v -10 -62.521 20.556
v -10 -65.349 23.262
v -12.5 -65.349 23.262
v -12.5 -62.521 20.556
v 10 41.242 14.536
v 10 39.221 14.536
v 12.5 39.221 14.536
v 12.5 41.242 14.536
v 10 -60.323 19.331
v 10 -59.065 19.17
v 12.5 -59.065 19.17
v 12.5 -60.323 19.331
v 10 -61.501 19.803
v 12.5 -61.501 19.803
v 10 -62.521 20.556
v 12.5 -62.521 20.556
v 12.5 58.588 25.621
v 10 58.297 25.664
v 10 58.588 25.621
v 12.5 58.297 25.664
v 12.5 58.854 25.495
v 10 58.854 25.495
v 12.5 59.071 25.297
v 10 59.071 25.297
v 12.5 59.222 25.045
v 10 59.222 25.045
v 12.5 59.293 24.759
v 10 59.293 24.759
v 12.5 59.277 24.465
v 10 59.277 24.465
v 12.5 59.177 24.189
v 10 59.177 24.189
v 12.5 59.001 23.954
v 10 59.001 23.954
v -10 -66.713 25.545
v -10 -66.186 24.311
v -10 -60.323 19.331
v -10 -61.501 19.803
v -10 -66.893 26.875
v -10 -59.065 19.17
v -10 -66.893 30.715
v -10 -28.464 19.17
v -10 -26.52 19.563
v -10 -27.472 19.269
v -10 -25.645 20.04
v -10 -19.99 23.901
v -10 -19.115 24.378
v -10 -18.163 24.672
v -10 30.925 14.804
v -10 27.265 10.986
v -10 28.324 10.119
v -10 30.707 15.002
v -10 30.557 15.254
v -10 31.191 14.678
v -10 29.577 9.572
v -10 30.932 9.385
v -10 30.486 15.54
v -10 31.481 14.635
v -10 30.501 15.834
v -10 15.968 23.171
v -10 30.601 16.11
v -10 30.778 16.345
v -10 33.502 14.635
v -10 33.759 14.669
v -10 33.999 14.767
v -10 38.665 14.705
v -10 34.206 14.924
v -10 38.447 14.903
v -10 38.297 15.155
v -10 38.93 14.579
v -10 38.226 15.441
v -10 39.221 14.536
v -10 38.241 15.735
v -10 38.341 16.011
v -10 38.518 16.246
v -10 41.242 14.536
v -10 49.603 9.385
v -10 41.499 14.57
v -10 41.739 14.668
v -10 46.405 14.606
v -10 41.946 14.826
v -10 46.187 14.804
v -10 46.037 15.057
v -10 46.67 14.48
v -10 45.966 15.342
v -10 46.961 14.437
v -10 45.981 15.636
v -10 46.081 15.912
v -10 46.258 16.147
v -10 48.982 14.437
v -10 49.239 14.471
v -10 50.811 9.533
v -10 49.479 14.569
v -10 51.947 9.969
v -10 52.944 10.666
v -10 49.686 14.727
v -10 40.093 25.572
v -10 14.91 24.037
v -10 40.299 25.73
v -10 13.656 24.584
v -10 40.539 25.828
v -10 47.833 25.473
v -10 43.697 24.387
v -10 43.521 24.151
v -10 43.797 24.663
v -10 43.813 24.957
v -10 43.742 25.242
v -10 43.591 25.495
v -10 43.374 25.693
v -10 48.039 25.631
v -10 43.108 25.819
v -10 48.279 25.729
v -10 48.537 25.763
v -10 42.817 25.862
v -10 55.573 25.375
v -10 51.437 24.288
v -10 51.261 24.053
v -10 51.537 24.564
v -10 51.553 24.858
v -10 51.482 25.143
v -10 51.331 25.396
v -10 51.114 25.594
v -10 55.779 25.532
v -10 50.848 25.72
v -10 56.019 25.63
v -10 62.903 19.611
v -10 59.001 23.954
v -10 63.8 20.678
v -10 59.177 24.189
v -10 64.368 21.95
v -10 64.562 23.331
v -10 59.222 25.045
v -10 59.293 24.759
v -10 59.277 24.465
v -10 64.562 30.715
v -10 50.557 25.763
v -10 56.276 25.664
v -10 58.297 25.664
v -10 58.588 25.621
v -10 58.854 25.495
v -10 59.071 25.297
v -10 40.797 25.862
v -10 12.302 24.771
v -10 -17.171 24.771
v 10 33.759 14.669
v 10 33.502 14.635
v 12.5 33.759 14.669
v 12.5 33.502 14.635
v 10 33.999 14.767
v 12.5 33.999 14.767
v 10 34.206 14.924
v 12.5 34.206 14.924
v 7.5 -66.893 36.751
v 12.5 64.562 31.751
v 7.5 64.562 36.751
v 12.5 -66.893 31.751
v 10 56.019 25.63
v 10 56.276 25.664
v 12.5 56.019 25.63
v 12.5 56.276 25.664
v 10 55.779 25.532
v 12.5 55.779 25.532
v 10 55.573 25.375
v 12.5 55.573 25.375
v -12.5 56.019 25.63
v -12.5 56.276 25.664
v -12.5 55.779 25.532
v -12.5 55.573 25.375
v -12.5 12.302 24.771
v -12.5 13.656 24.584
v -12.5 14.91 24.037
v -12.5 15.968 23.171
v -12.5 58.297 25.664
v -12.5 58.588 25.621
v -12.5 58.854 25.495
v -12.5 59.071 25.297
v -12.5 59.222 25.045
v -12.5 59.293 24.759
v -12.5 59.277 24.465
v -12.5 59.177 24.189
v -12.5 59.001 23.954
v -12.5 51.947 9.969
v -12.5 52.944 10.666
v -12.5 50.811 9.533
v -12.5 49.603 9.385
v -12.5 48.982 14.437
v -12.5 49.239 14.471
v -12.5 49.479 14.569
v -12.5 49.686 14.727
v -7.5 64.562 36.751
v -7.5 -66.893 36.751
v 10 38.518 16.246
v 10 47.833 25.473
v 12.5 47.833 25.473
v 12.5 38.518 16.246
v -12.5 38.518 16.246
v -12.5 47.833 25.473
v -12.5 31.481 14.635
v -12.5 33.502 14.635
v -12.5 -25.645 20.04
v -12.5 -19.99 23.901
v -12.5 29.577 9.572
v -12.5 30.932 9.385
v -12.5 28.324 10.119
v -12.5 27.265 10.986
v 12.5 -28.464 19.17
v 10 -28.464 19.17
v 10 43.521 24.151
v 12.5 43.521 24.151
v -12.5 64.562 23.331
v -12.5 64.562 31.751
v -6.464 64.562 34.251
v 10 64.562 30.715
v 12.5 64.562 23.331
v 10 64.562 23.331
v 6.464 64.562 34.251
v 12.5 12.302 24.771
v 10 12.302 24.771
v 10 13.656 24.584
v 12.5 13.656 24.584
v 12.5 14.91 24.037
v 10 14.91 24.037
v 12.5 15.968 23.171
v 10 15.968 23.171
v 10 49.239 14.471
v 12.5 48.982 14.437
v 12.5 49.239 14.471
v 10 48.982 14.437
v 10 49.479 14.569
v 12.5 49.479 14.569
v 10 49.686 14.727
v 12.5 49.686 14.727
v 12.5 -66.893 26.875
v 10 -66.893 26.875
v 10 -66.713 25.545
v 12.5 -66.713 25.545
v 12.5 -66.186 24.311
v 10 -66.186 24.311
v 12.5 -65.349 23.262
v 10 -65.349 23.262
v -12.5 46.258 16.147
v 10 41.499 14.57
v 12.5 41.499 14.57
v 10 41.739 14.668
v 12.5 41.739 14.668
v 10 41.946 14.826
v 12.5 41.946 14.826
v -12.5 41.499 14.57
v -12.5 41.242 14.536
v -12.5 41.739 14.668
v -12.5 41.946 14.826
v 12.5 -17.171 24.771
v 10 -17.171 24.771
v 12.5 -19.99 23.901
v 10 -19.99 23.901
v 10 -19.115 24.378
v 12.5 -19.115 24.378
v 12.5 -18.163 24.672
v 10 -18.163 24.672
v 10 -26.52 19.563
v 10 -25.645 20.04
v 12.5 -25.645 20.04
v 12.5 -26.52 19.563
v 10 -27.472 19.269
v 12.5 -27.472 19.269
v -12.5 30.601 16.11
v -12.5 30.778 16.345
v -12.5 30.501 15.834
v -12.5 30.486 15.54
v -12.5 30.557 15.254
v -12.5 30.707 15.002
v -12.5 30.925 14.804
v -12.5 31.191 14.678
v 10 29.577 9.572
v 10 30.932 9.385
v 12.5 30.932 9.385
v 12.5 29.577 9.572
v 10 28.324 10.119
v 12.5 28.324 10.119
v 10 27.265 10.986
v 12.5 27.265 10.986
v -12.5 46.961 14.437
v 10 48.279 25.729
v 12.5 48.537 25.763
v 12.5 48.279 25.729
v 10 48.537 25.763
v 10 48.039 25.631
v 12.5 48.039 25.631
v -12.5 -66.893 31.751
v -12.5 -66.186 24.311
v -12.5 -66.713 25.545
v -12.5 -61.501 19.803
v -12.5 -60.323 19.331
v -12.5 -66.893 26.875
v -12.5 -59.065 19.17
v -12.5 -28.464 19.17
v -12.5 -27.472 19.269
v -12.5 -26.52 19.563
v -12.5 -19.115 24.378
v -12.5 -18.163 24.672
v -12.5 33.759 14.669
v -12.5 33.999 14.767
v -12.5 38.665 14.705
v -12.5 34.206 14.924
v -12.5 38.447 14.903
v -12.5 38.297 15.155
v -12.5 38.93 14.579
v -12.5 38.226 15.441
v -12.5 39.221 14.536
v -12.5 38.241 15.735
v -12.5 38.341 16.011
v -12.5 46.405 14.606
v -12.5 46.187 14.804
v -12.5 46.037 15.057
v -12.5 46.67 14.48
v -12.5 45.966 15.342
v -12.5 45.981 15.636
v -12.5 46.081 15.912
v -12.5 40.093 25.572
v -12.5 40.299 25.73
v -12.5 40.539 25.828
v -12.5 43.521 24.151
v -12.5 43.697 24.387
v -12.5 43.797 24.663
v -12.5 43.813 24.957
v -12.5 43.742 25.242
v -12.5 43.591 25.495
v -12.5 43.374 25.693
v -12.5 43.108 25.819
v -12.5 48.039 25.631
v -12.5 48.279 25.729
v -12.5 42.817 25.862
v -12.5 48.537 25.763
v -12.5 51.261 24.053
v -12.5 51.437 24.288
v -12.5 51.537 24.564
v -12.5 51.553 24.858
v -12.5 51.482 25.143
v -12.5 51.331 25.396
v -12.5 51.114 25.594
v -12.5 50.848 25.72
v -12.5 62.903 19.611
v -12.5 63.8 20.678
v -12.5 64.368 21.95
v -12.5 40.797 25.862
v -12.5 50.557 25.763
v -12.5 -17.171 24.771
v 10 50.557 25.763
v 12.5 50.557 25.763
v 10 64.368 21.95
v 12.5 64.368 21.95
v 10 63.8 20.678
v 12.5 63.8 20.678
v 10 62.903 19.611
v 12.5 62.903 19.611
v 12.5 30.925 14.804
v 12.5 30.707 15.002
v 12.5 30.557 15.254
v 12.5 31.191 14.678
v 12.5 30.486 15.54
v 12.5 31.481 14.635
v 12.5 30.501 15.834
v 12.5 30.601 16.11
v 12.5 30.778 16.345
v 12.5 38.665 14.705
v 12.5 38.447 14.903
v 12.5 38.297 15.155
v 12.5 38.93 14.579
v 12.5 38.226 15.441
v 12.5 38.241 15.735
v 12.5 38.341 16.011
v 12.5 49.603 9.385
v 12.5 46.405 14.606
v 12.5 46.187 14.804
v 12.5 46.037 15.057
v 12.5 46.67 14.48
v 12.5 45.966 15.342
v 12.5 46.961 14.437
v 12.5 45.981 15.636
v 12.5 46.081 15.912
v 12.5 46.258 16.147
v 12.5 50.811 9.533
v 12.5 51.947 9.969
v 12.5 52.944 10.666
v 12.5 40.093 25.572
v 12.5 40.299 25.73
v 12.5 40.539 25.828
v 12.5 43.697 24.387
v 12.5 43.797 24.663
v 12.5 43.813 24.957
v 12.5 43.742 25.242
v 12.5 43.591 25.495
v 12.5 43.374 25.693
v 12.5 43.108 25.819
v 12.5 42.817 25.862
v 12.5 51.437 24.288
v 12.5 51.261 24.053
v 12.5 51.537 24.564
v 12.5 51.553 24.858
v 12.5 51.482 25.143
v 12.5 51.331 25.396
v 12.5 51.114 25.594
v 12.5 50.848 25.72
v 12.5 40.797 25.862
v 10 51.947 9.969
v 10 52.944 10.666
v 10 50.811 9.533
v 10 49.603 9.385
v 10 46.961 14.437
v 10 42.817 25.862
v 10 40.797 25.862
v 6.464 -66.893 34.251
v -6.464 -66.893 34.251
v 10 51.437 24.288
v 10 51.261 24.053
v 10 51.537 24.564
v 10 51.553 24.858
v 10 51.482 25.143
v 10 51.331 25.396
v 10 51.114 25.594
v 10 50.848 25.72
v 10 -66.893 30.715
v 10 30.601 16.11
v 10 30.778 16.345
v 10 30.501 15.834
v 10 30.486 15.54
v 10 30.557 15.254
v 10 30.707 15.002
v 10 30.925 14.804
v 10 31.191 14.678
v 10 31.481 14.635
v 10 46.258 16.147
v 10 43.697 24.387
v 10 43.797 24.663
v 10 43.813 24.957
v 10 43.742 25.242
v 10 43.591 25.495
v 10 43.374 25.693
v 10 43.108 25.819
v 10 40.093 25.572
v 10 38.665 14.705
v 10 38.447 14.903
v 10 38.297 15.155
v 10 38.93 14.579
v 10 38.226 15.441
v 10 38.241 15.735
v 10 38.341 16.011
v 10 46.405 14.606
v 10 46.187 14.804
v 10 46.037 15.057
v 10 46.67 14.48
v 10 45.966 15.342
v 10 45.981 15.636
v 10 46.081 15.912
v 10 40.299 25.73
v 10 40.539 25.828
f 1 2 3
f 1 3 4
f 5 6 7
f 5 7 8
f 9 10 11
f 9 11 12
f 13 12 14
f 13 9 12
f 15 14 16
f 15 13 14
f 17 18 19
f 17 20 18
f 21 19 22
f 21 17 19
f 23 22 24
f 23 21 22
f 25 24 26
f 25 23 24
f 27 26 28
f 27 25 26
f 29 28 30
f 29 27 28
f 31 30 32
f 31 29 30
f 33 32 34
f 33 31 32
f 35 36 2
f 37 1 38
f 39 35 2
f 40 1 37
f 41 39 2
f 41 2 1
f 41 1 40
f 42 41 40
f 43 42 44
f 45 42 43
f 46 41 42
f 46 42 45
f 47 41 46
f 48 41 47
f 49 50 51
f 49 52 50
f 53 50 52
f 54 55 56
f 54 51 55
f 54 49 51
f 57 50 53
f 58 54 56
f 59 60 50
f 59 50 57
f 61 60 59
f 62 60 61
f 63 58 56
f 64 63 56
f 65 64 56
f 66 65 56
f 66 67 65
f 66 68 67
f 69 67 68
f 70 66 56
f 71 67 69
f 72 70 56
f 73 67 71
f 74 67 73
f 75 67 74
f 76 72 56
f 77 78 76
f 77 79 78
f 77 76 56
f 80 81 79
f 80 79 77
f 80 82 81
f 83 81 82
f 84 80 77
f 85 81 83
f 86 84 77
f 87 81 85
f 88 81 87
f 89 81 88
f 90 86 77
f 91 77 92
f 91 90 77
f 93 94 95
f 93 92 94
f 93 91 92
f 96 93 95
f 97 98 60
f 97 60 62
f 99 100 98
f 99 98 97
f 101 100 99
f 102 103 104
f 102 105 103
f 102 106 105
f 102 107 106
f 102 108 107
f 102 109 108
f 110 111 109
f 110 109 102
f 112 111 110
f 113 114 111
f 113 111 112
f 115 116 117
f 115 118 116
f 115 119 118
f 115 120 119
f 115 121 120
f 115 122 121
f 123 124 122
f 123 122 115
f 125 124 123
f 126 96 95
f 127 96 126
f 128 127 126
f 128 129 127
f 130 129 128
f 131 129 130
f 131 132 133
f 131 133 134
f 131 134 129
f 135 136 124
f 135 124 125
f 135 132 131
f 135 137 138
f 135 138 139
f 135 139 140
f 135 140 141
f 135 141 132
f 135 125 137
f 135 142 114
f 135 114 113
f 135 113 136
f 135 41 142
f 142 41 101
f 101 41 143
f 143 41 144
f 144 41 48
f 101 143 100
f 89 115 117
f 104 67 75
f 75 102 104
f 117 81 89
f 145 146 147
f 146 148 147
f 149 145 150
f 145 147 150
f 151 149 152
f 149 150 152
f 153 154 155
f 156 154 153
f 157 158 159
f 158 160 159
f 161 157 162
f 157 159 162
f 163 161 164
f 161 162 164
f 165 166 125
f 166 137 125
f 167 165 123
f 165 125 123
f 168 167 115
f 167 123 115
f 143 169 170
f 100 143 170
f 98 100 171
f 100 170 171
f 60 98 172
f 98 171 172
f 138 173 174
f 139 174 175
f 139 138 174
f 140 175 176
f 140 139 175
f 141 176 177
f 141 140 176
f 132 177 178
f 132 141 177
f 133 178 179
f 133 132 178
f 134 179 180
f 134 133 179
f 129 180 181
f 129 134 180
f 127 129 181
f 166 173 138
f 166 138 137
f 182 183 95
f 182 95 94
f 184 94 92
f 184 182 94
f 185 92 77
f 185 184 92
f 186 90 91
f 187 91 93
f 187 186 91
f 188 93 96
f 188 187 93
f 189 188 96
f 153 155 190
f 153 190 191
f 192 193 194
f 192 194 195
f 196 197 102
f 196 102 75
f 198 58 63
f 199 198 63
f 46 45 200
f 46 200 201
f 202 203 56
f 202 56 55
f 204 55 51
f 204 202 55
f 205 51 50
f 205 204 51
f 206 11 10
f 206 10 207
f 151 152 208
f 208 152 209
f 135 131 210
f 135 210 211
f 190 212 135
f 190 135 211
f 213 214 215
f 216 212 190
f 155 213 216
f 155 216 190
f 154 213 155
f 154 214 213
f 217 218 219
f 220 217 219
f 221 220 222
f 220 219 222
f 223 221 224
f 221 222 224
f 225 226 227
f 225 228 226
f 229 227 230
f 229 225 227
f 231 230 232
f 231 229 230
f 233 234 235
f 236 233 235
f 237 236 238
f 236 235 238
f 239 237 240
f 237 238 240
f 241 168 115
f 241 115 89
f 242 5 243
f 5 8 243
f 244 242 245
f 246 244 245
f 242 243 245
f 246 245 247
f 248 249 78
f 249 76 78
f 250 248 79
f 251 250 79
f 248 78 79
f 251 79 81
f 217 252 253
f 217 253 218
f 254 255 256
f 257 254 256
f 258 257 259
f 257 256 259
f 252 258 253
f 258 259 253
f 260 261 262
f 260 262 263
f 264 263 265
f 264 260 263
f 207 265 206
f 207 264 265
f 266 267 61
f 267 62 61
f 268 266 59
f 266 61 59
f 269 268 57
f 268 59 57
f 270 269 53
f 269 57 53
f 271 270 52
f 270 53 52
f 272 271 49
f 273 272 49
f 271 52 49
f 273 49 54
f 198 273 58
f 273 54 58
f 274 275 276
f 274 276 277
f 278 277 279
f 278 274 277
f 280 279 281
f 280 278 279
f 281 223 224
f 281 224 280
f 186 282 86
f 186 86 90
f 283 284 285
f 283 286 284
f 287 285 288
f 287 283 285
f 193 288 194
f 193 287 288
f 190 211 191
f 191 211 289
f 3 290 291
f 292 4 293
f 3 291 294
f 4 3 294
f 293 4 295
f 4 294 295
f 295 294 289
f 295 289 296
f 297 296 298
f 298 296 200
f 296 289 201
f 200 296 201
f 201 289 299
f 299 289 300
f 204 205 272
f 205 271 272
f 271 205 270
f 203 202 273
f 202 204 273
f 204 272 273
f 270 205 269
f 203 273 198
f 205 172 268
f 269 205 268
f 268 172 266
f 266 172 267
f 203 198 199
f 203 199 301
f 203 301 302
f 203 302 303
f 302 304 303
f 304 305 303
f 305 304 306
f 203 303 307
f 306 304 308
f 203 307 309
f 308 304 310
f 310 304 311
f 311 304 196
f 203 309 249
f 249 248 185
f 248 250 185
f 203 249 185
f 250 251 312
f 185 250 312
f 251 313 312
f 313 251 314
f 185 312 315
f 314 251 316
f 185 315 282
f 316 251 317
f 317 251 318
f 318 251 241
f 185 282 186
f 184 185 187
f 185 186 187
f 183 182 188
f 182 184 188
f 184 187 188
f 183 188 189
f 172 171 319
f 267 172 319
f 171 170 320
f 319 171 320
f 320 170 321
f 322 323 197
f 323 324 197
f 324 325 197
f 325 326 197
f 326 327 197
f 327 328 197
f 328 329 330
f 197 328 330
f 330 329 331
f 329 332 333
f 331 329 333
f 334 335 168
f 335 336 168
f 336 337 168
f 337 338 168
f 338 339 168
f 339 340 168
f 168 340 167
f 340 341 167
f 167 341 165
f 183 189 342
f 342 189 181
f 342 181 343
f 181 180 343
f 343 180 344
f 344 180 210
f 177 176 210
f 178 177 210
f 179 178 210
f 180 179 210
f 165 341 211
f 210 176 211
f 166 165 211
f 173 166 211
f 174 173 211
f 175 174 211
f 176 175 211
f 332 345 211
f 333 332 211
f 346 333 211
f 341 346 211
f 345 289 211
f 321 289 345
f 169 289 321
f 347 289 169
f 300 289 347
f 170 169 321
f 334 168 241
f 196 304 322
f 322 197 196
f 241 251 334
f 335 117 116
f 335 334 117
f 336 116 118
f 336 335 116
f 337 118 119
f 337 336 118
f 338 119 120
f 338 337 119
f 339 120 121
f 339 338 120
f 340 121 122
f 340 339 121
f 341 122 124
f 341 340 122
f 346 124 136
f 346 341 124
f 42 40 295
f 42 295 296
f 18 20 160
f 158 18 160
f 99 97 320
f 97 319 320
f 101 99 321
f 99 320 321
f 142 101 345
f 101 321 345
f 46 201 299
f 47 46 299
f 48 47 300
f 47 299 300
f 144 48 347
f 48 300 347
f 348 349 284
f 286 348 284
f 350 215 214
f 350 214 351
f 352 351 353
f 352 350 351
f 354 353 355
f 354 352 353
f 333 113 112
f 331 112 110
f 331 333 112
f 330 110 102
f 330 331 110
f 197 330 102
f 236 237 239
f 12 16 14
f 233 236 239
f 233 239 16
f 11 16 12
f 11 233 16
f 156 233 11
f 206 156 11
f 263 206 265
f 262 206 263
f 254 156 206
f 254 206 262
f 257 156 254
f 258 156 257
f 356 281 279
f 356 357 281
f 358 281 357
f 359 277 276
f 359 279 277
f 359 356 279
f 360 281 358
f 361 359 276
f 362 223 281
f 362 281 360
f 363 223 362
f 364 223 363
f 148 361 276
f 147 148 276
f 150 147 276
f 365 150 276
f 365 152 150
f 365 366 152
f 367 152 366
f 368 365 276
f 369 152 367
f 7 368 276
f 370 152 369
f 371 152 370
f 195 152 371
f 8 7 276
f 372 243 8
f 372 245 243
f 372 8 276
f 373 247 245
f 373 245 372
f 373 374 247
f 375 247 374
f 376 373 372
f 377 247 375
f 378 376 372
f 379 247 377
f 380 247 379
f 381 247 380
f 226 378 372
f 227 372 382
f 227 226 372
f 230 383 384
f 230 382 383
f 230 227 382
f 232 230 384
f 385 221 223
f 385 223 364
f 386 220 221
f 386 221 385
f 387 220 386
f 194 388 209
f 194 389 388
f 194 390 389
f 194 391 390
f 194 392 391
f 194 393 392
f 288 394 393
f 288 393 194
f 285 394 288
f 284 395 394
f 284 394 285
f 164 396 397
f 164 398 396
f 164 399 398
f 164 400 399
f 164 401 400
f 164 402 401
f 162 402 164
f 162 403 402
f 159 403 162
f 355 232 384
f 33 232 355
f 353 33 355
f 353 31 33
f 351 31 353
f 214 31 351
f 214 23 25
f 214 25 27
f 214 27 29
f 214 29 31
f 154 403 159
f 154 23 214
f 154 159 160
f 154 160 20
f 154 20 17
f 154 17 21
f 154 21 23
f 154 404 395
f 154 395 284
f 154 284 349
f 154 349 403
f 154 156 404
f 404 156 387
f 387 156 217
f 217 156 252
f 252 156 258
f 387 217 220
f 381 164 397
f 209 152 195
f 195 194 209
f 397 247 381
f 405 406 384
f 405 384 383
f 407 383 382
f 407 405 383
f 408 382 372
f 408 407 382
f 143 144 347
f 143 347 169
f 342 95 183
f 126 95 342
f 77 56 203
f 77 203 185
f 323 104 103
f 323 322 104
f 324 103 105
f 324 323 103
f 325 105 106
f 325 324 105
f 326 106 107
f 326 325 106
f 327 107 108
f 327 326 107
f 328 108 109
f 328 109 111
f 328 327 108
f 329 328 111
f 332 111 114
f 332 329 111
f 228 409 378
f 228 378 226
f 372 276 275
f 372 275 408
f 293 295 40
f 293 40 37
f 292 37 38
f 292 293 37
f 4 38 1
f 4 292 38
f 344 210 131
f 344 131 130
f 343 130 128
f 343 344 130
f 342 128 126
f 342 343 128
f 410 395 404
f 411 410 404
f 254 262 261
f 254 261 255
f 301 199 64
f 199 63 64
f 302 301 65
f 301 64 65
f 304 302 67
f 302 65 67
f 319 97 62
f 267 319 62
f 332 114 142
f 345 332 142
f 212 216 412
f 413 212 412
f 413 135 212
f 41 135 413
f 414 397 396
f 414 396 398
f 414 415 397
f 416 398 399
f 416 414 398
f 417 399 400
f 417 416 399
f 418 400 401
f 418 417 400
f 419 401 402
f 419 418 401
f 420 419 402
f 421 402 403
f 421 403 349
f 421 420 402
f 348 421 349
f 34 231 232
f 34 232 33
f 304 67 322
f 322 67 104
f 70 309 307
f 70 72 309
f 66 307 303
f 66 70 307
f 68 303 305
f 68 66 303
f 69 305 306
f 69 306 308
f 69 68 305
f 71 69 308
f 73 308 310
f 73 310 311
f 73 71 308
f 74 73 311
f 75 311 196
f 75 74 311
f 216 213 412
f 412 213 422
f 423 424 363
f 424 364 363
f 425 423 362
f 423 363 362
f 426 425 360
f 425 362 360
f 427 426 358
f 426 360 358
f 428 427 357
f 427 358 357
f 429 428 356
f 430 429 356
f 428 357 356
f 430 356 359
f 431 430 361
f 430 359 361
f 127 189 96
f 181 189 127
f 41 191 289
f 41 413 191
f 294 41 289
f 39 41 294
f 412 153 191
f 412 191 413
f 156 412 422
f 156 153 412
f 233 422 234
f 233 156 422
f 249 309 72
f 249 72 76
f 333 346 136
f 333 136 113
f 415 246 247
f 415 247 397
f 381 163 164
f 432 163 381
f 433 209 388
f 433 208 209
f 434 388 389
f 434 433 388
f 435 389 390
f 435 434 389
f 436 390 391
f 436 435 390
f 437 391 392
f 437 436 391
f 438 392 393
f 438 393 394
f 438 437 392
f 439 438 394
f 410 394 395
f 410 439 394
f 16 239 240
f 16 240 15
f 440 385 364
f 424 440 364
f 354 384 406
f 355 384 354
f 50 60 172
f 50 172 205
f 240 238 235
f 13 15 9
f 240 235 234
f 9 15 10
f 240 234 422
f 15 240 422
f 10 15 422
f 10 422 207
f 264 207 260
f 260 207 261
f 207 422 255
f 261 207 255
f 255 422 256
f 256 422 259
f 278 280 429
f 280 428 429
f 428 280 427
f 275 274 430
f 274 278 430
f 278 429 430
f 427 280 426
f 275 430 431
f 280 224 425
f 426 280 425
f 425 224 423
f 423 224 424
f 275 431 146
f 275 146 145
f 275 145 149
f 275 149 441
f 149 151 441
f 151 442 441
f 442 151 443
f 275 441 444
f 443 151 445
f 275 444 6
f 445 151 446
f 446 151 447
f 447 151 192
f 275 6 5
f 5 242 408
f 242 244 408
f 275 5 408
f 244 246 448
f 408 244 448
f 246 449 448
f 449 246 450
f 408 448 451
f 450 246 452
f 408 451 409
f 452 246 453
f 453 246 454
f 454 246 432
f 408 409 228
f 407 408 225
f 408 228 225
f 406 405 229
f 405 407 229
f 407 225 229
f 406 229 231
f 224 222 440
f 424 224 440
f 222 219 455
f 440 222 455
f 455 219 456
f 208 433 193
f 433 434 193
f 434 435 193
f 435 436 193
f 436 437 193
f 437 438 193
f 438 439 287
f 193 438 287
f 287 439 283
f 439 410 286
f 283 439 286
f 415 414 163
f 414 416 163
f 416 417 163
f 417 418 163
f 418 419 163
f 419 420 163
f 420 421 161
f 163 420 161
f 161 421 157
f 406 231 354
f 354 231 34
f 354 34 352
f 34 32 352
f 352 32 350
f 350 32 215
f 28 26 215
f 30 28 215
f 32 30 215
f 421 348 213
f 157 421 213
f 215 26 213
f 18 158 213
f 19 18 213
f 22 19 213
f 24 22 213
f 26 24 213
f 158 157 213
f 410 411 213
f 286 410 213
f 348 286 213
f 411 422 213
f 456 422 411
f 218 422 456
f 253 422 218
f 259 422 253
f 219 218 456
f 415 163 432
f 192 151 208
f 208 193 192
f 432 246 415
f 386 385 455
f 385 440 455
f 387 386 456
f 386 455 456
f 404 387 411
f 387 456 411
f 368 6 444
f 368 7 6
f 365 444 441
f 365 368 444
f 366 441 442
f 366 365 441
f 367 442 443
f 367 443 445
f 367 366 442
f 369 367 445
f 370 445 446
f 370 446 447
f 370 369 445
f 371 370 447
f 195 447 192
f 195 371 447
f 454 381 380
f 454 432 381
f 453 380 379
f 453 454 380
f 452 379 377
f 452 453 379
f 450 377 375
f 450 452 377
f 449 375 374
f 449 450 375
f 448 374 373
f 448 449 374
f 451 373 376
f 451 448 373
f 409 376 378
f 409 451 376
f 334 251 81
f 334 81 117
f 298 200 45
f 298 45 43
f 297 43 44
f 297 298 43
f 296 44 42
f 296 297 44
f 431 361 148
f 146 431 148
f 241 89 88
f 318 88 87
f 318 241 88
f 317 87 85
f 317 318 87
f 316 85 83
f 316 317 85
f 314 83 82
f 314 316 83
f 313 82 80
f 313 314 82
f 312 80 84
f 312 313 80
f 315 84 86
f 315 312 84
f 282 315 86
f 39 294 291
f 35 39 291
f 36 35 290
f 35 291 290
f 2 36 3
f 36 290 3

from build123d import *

# Parameters (mm, degrees)
F1_DEPTH     = 12.5
F2_SIZE      = 5
F3_T         = -2.5
F4_T1_DEPTH  = 2.5
F4_T3_DEPTH  = 2.5
F4_T5_DEPTH  = 2.5
F4_T7_DEPTH  = 2.5
F4_T9_DEPTH  = 13.1824295502
F4_T11_DEPTH = 13.1824295502
F4_T13_DEPTH = 12.5312469121
F4_T15_DEPTH = 12.5312469121
F4_T17_DEPTH = 10.2199869631
F4_T19_DEPTH = 10.2199869631
F4_T21_DEPTH = 13.4131081399
F4_T23_DEPTH = 13.4131081399
F4_T25_DEPTH = 12.0794727567
F4_T27_DEPTH = 12.0794727567
F4_T29_DEPTH = 13.6486136239
F4_T31_DEPTH = 13.6486136239
F6_DEPTH     = 12.5
F7_R         = 1


# Not quite as in the source:
# - a fillet or chamfer that OpenCascade refuses, or shapes differently, is made with other operations: its cross-section is extruded or revolved along the edge and cut away or added


with BuildPart() as f1:
    # F0 (on Right) → F1 (new body, symmetric)
    with BuildSketch(Plane.YZ):
        Polygon((64.5619183779, 36.750972271), (-66.8933242559, 36.750972271), (-66.8933242559, 24.738561362), (-61.0711984336, 19.1697143018), (-26.9197300076, 19.1697143018), (-18.7147669494, 24.7712358832), (14.4842416048, 24.7712358832), (28.7493690848, 9.385228157), (51.5191629529, 9.385228157), (64.5619183779, 21.1007967591), align=None)
    extrude(amount=F1_DEPTH, both=True)

    # F2
    f2_edges = [f1.edges().sort_by_distance(p)[0] for p in [
        (12.5, -1.165703, 36.750972),
        (-12.5, -1.165703, 36.750972),
    ]]
    chamfer(f2_edges, length=F2_SIZE)

    # F3
    f3_openings = [f1.faces().sort_by_distance(p)[0] for p in [
        (0, -66.893324, 30.350708),
        (0, -63.982261, 21.954138),
        (0, -43.995464, 19.169714),
        (0, -22.817248, 21.970475),
        (0, -2.115263, 24.771236),
        (0, 21.616805, 17.078232),
        (0, 40.134266, 9.385228),
        (0, 58.040541, 15.243012),
        (0, 64.561918, 28.50552),
    ]]
    offset(amount=F3_T, openings=f3_openings)

    # F4: fillet of radius 5 on 22 edges, made by hand

    # F4_s2 → F4_t1 (join)
    with BuildSketch(Plane.YZ.offset(-12.5)):
        with BuildLine():
            ThreePointArc((-19.9899366893, 23.9006785429), (-18.6460299918, 24.5486417325), (-17.1707695568, 24.7712358832))
            Line((-17.1707695568, 24.7712358832), (-18.7147669494, 24.7712358832))
            Line((-18.7147669494, 24.7712358832), (-19.9899366893, 23.9006785429))
        make_face()
    extrude(amount=F4_T1_DEPTH)

    # F4_s4 → F4_t3 (join)
    with BuildSketch(Plane.YZ.offset(10)):
        with BuildLine():
            ThreePointArc((-19.9899366893, 23.9006785429), (-18.6460299918, 24.5486417325), (-17.1707695568, 24.7712358832))
            Line((-17.1707695568, 24.7712358832), (-18.7147669494, 24.7712358832))
            Line((-18.7147669494, 24.7712358832), (-19.9899366893, 23.9006785429))
        make_face()
    extrude(amount=F4_T3_DEPTH)

    # F4_s6 → F4_t5 (join)
    with BuildSketch(Plane.YZ.offset(-12.5)):
        with BuildLine():
            ThreePointArc((12.3016199768, 24.7712358832), (14.3019608026, 24.3536628145), (15.9681862456, 23.1706905155))
            Line((15.9681862456, 23.1706905155), (14.4842416048, 24.7712358832))
            Line((14.4842416048, 24.7712358832), (12.3016199768, 24.7712358832))
        make_face()
    extrude(amount=F4_T5_DEPTH)

    # F4_s8 → F4_t7 (join)
    with BuildSketch(Plane.YZ.offset(10)):
        with BuildLine():
            ThreePointArc((12.3016199768, 24.7712358832), (14.3019608026, 24.3536628145), (15.9681862456, 23.1706905155))
            Line((15.9681862456, 23.1706905155), (14.4842416048, 24.7712358832))
            Line((14.4842416048, 24.7712358832), (12.3016199768, 24.7712358832))
        make_face()
    extrude(amount=F4_T7_DEPTH)

    # F4_s10 → F4_t9 (cut)
    with BuildSketch(Plane.YZ.offset(-17.8412147751)):
        with BuildLine():
            ThreePointArc((-66.8933242559, 26.8750472721), (-66.4911680254, 24.9104015861), (-65.3493911873, 23.2617937014))
            Line((-65.3493911873, 23.2617937014), (-66.8933242559, 24.738561362))
            Line((-66.8933242559, 24.738561362), (-66.8933242559, 26.8750472721))
        make_face()
    extrude(amount=F4_T9_DEPTH, mode=Mode.SUBTRACT)

    # F4_s12 → F4_t11 (cut)
    with BuildSketch(Plane.YZ.offset(4.6587852249)):
        with BuildLine():
            ThreePointArc((-66.8933242559, 26.8750472721), (-66.4911680254, 24.9104015861), (-65.3493911873, 23.2617937014))
            Line((-65.3493911873, 23.2617937014), (-66.8933242559, 24.738561362))
            Line((-66.8933242559, 24.738561362), (-66.8933242559, 26.8750472721))
        make_face()
    extrude(amount=F4_T11_DEPTH, mode=Mode.SUBTRACT)

    # F4_s14 → F4_t13 (cut)
    with BuildSketch(Plane.YZ.offset(-17.5156234561)):
        with BuildLine():
            ThreePointArc((-59.0649490512, 19.1697143018), (-60.9269012722, 19.5293335064), (-62.5210159826, 20.5564607312))
            Line((-62.5210159826, 20.5564607312), (-61.0711984336, 19.1697143018))
            Line((-61.0711984336, 19.1697143018), (-59.0649490512, 19.1697143018))
        make_face()
    extrude(amount=F4_T13_DEPTH, mode=Mode.SUBTRACT)

    # F4_s16 → F4_t15 (cut)
    with BuildSketch(Plane.YZ.offset(4.9843765439)):
        with BuildLine():
            ThreePointArc((-59.0649490512, 19.1697143018), (-60.9269012722, 19.5293335064), (-62.5210159826, 20.5564607312))
            Line((-62.5210159826, 20.5564607312), (-61.0711984336, 19.1697143018))
            Line((-61.0711984336, 19.1697143018), (-59.0649490512, 19.1697143018))
        make_face()
    extrude(amount=F4_T15_DEPTH, mode=Mode.SUBTRACT)

    # F4_s18 → F4_t17 (cut)
    with BuildSketch(Plane.YZ.offset(-16.3599934815)):
        with BuildLine():
            ThreePointArc((-25.6445602678, 20.0402716422), (-26.9884669653, 19.3923084525), (-28.4637274003, 19.1697143018))
            Line((-28.4637274003, 19.1697143018), (-26.9197300076, 19.1697143018))
            Line((-26.9197300076, 19.1697143018), (-25.6445602678, 20.0402716422))
        make_face()
    extrude(amount=F4_T17_DEPTH, mode=Mode.SUBTRACT)

    # F4_s20 → F4_t19 (cut)
    with BuildSketch(Plane.YZ.offset(6.1400065185)):
        with BuildLine():
            ThreePointArc((-25.6445602678, 20.0402716422), (-26.9884669653, 19.3923084525), (-28.4637274003, 19.1697143018))
            Line((-28.4637274003, 19.1697143018), (-26.9197300076, 19.1697143018))
            Line((-26.9197300076, 19.1697143018), (-25.6445602678, 20.0402716422))
        make_face()
    extrude(amount=F4_T19_DEPTH, mode=Mode.SUBTRACT)

    # F4_s22 → F4_t21 (cut)
    with BuildSketch(Plane.YZ.offset(-17.9565540699)):
        with BuildLine():
            ThreePointArc((30.9319907128, 9.385228157), (28.931649887, 9.8028012257), (27.2654244441, 10.9857735247))
            Line((27.2654244441, 10.9857735247), (28.7493690848, 9.385228157))
            Line((28.7493690848, 9.385228157), (30.9319907128, 9.385228157))
        make_face()
    extrude(amount=F4_T21_DEPTH, mode=Mode.SUBTRACT)

    # F4_s24 → F4_t23 (cut)
    with BuildSketch(Plane.YZ.offset(4.5434459301)):
        with BuildLine():
            ThreePointArc((30.9319907128, 9.385228157), (28.931649887, 9.8028012257), (27.2654244441, 10.9857735247))
            Line((27.2654244441, 10.9857735247), (28.7493690848, 9.385228157))
            Line((28.7493690848, 9.385228157), (30.9319907128, 9.385228157))
        make_face()
    extrude(amount=F4_T23_DEPTH, mode=Mode.SUBTRACT)

    # F4_s26 → F4_t25 (cut)
    with BuildSketch(Plane.YZ.offset(-17.2897363783)):
        with BuildLine():
            ThreePointArc((52.9444804464, 10.6655101473), (51.3923198194, 9.7162566403), (49.6032684016, 9.385228157))
            Line((49.6032684016, 9.385228157), (51.5191629529, 9.385228157))
            Line((51.5191629529, 9.385228157), (52.9444804464, 10.6655101473))
        make_face()
    extrude(amount=F4_T25_DEPTH, mode=Mode.SUBTRACT)

    # F4_s28 → F4_t27 (cut)
    with BuildSketch(Plane.YZ.offset(5.2102636217)):
        with BuildLine():
            ThreePointArc((52.9444804464, 10.6655101473), (51.3923198194, 9.7162566403), (49.6032684016, 9.385228157))
            Line((49.6032684016, 9.385228157), (51.5191629529, 9.385228157))
            Line((51.5191629529, 9.385228157), (52.9444804464, 10.6655101473))
        make_face()
    extrude(amount=F4_T27_DEPTH, mode=Mode.SUBTRACT)

    # F4_s30 → F4_t29 (cut)
    with BuildSketch(Plane.YZ.offset(4.425693188)):
        with BuildLine():
            ThreePointArc((64.5619183779, 23.3305194839), (64.128430188, 21.2941084527), (62.9031304227, 19.6108014742))
            Line((62.9031304227, 19.6108014742), (64.5619183779, 21.1007967591))
            Line((64.5619183779, 21.1007967591), (64.5619183779, 23.3305194839))
        make_face()
    extrude(amount=F4_T29_DEPTH, mode=Mode.SUBTRACT)

    # F4_s32 → F4_t31 (cut)
    with BuildSketch(Plane.YZ.offset(-18.074306812)):
        with BuildLine():
            ThreePointArc((64.5619183779, 23.3305194839), (64.128430188, 21.2941084527), (62.9031304227, 19.6108014742))
            Line((62.9031304227, 19.6108014742), (64.5619183779, 21.1007967591))
            Line((64.5619183779, 21.1007967591), (64.5619183779, 23.3305194839))
        make_face()
    extrude(amount=F4_T31_DEPTH, mode=Mode.SUBTRACT)

    # F5 (on Right) → F6 (cut, symmetric)
    with BuildSketch(Plane.YZ):
        Polygon((49.3934080005, 14.4370365888), (60.7276931405, 25.6640575826), (55.865034461, 25.6640575826), (44.530749321, 14.4370365888), align=None)
        Polygon((48.1250985598, 25.7630067087), (36.7908134197, 14.5359857149), (41.6534720992, 14.5359857149), (52.9877572393, 25.7630067087), align=None)
        Polygon((40.3851626585, 25.8619558348), (29.0508775185, 14.6349348409), (33.913536198, 14.6349348409), (45.247821338, 25.8619558348), align=None)
    extrude(amount=F6_DEPTH, both=True, mode=Mode.SUBTRACT)

    # F7
    f7_edges = [f1.edges().sort_by_distance(p)[0] for p in [
        (-11.25, 60.727693, 25.664058),
        (-11.25, 55.865034, 25.664058),
        (-11.25, 44.530749, 14.437037),
        (-11.25, 36.790813, 14.535986),
        (-11.25, 29.050878, 14.634935),
        (-11.25, 49.393408, 14.437037),
        (-11.25, 41.653472, 14.535986),
        (-11.25, 33.913536, 14.634935),
        (-11.25, 52.987757, 25.763007),
        (-11.25, 45.247821, 25.861956),
        (-11.25, 40.385163, 25.861956),
        (-11.25, 48.125099, 25.763007),
        (11.25, 60.727693, 25.664058),
        (11.25, 52.987757, 25.763007),
        (11.25, 45.247821, 25.861956),
        (11.25, 49.393408, 14.437037),
        (11.25, 41.653472, 14.535986),
        (11.25, 33.913536, 14.634935),
        (11.25, 40.385163, 25.861956),
        (11.25, 48.125099, 25.763007),
        (11.25, 55.865034, 25.664058),
        (11.25, 29.050878, 14.634935),
        (11.25, 36.790813, 14.535986),
        (11.25, 44.530749, 14.437037),
    ]]
    fillet(f7_edges, radius=F7_R)


solid = f1.part
